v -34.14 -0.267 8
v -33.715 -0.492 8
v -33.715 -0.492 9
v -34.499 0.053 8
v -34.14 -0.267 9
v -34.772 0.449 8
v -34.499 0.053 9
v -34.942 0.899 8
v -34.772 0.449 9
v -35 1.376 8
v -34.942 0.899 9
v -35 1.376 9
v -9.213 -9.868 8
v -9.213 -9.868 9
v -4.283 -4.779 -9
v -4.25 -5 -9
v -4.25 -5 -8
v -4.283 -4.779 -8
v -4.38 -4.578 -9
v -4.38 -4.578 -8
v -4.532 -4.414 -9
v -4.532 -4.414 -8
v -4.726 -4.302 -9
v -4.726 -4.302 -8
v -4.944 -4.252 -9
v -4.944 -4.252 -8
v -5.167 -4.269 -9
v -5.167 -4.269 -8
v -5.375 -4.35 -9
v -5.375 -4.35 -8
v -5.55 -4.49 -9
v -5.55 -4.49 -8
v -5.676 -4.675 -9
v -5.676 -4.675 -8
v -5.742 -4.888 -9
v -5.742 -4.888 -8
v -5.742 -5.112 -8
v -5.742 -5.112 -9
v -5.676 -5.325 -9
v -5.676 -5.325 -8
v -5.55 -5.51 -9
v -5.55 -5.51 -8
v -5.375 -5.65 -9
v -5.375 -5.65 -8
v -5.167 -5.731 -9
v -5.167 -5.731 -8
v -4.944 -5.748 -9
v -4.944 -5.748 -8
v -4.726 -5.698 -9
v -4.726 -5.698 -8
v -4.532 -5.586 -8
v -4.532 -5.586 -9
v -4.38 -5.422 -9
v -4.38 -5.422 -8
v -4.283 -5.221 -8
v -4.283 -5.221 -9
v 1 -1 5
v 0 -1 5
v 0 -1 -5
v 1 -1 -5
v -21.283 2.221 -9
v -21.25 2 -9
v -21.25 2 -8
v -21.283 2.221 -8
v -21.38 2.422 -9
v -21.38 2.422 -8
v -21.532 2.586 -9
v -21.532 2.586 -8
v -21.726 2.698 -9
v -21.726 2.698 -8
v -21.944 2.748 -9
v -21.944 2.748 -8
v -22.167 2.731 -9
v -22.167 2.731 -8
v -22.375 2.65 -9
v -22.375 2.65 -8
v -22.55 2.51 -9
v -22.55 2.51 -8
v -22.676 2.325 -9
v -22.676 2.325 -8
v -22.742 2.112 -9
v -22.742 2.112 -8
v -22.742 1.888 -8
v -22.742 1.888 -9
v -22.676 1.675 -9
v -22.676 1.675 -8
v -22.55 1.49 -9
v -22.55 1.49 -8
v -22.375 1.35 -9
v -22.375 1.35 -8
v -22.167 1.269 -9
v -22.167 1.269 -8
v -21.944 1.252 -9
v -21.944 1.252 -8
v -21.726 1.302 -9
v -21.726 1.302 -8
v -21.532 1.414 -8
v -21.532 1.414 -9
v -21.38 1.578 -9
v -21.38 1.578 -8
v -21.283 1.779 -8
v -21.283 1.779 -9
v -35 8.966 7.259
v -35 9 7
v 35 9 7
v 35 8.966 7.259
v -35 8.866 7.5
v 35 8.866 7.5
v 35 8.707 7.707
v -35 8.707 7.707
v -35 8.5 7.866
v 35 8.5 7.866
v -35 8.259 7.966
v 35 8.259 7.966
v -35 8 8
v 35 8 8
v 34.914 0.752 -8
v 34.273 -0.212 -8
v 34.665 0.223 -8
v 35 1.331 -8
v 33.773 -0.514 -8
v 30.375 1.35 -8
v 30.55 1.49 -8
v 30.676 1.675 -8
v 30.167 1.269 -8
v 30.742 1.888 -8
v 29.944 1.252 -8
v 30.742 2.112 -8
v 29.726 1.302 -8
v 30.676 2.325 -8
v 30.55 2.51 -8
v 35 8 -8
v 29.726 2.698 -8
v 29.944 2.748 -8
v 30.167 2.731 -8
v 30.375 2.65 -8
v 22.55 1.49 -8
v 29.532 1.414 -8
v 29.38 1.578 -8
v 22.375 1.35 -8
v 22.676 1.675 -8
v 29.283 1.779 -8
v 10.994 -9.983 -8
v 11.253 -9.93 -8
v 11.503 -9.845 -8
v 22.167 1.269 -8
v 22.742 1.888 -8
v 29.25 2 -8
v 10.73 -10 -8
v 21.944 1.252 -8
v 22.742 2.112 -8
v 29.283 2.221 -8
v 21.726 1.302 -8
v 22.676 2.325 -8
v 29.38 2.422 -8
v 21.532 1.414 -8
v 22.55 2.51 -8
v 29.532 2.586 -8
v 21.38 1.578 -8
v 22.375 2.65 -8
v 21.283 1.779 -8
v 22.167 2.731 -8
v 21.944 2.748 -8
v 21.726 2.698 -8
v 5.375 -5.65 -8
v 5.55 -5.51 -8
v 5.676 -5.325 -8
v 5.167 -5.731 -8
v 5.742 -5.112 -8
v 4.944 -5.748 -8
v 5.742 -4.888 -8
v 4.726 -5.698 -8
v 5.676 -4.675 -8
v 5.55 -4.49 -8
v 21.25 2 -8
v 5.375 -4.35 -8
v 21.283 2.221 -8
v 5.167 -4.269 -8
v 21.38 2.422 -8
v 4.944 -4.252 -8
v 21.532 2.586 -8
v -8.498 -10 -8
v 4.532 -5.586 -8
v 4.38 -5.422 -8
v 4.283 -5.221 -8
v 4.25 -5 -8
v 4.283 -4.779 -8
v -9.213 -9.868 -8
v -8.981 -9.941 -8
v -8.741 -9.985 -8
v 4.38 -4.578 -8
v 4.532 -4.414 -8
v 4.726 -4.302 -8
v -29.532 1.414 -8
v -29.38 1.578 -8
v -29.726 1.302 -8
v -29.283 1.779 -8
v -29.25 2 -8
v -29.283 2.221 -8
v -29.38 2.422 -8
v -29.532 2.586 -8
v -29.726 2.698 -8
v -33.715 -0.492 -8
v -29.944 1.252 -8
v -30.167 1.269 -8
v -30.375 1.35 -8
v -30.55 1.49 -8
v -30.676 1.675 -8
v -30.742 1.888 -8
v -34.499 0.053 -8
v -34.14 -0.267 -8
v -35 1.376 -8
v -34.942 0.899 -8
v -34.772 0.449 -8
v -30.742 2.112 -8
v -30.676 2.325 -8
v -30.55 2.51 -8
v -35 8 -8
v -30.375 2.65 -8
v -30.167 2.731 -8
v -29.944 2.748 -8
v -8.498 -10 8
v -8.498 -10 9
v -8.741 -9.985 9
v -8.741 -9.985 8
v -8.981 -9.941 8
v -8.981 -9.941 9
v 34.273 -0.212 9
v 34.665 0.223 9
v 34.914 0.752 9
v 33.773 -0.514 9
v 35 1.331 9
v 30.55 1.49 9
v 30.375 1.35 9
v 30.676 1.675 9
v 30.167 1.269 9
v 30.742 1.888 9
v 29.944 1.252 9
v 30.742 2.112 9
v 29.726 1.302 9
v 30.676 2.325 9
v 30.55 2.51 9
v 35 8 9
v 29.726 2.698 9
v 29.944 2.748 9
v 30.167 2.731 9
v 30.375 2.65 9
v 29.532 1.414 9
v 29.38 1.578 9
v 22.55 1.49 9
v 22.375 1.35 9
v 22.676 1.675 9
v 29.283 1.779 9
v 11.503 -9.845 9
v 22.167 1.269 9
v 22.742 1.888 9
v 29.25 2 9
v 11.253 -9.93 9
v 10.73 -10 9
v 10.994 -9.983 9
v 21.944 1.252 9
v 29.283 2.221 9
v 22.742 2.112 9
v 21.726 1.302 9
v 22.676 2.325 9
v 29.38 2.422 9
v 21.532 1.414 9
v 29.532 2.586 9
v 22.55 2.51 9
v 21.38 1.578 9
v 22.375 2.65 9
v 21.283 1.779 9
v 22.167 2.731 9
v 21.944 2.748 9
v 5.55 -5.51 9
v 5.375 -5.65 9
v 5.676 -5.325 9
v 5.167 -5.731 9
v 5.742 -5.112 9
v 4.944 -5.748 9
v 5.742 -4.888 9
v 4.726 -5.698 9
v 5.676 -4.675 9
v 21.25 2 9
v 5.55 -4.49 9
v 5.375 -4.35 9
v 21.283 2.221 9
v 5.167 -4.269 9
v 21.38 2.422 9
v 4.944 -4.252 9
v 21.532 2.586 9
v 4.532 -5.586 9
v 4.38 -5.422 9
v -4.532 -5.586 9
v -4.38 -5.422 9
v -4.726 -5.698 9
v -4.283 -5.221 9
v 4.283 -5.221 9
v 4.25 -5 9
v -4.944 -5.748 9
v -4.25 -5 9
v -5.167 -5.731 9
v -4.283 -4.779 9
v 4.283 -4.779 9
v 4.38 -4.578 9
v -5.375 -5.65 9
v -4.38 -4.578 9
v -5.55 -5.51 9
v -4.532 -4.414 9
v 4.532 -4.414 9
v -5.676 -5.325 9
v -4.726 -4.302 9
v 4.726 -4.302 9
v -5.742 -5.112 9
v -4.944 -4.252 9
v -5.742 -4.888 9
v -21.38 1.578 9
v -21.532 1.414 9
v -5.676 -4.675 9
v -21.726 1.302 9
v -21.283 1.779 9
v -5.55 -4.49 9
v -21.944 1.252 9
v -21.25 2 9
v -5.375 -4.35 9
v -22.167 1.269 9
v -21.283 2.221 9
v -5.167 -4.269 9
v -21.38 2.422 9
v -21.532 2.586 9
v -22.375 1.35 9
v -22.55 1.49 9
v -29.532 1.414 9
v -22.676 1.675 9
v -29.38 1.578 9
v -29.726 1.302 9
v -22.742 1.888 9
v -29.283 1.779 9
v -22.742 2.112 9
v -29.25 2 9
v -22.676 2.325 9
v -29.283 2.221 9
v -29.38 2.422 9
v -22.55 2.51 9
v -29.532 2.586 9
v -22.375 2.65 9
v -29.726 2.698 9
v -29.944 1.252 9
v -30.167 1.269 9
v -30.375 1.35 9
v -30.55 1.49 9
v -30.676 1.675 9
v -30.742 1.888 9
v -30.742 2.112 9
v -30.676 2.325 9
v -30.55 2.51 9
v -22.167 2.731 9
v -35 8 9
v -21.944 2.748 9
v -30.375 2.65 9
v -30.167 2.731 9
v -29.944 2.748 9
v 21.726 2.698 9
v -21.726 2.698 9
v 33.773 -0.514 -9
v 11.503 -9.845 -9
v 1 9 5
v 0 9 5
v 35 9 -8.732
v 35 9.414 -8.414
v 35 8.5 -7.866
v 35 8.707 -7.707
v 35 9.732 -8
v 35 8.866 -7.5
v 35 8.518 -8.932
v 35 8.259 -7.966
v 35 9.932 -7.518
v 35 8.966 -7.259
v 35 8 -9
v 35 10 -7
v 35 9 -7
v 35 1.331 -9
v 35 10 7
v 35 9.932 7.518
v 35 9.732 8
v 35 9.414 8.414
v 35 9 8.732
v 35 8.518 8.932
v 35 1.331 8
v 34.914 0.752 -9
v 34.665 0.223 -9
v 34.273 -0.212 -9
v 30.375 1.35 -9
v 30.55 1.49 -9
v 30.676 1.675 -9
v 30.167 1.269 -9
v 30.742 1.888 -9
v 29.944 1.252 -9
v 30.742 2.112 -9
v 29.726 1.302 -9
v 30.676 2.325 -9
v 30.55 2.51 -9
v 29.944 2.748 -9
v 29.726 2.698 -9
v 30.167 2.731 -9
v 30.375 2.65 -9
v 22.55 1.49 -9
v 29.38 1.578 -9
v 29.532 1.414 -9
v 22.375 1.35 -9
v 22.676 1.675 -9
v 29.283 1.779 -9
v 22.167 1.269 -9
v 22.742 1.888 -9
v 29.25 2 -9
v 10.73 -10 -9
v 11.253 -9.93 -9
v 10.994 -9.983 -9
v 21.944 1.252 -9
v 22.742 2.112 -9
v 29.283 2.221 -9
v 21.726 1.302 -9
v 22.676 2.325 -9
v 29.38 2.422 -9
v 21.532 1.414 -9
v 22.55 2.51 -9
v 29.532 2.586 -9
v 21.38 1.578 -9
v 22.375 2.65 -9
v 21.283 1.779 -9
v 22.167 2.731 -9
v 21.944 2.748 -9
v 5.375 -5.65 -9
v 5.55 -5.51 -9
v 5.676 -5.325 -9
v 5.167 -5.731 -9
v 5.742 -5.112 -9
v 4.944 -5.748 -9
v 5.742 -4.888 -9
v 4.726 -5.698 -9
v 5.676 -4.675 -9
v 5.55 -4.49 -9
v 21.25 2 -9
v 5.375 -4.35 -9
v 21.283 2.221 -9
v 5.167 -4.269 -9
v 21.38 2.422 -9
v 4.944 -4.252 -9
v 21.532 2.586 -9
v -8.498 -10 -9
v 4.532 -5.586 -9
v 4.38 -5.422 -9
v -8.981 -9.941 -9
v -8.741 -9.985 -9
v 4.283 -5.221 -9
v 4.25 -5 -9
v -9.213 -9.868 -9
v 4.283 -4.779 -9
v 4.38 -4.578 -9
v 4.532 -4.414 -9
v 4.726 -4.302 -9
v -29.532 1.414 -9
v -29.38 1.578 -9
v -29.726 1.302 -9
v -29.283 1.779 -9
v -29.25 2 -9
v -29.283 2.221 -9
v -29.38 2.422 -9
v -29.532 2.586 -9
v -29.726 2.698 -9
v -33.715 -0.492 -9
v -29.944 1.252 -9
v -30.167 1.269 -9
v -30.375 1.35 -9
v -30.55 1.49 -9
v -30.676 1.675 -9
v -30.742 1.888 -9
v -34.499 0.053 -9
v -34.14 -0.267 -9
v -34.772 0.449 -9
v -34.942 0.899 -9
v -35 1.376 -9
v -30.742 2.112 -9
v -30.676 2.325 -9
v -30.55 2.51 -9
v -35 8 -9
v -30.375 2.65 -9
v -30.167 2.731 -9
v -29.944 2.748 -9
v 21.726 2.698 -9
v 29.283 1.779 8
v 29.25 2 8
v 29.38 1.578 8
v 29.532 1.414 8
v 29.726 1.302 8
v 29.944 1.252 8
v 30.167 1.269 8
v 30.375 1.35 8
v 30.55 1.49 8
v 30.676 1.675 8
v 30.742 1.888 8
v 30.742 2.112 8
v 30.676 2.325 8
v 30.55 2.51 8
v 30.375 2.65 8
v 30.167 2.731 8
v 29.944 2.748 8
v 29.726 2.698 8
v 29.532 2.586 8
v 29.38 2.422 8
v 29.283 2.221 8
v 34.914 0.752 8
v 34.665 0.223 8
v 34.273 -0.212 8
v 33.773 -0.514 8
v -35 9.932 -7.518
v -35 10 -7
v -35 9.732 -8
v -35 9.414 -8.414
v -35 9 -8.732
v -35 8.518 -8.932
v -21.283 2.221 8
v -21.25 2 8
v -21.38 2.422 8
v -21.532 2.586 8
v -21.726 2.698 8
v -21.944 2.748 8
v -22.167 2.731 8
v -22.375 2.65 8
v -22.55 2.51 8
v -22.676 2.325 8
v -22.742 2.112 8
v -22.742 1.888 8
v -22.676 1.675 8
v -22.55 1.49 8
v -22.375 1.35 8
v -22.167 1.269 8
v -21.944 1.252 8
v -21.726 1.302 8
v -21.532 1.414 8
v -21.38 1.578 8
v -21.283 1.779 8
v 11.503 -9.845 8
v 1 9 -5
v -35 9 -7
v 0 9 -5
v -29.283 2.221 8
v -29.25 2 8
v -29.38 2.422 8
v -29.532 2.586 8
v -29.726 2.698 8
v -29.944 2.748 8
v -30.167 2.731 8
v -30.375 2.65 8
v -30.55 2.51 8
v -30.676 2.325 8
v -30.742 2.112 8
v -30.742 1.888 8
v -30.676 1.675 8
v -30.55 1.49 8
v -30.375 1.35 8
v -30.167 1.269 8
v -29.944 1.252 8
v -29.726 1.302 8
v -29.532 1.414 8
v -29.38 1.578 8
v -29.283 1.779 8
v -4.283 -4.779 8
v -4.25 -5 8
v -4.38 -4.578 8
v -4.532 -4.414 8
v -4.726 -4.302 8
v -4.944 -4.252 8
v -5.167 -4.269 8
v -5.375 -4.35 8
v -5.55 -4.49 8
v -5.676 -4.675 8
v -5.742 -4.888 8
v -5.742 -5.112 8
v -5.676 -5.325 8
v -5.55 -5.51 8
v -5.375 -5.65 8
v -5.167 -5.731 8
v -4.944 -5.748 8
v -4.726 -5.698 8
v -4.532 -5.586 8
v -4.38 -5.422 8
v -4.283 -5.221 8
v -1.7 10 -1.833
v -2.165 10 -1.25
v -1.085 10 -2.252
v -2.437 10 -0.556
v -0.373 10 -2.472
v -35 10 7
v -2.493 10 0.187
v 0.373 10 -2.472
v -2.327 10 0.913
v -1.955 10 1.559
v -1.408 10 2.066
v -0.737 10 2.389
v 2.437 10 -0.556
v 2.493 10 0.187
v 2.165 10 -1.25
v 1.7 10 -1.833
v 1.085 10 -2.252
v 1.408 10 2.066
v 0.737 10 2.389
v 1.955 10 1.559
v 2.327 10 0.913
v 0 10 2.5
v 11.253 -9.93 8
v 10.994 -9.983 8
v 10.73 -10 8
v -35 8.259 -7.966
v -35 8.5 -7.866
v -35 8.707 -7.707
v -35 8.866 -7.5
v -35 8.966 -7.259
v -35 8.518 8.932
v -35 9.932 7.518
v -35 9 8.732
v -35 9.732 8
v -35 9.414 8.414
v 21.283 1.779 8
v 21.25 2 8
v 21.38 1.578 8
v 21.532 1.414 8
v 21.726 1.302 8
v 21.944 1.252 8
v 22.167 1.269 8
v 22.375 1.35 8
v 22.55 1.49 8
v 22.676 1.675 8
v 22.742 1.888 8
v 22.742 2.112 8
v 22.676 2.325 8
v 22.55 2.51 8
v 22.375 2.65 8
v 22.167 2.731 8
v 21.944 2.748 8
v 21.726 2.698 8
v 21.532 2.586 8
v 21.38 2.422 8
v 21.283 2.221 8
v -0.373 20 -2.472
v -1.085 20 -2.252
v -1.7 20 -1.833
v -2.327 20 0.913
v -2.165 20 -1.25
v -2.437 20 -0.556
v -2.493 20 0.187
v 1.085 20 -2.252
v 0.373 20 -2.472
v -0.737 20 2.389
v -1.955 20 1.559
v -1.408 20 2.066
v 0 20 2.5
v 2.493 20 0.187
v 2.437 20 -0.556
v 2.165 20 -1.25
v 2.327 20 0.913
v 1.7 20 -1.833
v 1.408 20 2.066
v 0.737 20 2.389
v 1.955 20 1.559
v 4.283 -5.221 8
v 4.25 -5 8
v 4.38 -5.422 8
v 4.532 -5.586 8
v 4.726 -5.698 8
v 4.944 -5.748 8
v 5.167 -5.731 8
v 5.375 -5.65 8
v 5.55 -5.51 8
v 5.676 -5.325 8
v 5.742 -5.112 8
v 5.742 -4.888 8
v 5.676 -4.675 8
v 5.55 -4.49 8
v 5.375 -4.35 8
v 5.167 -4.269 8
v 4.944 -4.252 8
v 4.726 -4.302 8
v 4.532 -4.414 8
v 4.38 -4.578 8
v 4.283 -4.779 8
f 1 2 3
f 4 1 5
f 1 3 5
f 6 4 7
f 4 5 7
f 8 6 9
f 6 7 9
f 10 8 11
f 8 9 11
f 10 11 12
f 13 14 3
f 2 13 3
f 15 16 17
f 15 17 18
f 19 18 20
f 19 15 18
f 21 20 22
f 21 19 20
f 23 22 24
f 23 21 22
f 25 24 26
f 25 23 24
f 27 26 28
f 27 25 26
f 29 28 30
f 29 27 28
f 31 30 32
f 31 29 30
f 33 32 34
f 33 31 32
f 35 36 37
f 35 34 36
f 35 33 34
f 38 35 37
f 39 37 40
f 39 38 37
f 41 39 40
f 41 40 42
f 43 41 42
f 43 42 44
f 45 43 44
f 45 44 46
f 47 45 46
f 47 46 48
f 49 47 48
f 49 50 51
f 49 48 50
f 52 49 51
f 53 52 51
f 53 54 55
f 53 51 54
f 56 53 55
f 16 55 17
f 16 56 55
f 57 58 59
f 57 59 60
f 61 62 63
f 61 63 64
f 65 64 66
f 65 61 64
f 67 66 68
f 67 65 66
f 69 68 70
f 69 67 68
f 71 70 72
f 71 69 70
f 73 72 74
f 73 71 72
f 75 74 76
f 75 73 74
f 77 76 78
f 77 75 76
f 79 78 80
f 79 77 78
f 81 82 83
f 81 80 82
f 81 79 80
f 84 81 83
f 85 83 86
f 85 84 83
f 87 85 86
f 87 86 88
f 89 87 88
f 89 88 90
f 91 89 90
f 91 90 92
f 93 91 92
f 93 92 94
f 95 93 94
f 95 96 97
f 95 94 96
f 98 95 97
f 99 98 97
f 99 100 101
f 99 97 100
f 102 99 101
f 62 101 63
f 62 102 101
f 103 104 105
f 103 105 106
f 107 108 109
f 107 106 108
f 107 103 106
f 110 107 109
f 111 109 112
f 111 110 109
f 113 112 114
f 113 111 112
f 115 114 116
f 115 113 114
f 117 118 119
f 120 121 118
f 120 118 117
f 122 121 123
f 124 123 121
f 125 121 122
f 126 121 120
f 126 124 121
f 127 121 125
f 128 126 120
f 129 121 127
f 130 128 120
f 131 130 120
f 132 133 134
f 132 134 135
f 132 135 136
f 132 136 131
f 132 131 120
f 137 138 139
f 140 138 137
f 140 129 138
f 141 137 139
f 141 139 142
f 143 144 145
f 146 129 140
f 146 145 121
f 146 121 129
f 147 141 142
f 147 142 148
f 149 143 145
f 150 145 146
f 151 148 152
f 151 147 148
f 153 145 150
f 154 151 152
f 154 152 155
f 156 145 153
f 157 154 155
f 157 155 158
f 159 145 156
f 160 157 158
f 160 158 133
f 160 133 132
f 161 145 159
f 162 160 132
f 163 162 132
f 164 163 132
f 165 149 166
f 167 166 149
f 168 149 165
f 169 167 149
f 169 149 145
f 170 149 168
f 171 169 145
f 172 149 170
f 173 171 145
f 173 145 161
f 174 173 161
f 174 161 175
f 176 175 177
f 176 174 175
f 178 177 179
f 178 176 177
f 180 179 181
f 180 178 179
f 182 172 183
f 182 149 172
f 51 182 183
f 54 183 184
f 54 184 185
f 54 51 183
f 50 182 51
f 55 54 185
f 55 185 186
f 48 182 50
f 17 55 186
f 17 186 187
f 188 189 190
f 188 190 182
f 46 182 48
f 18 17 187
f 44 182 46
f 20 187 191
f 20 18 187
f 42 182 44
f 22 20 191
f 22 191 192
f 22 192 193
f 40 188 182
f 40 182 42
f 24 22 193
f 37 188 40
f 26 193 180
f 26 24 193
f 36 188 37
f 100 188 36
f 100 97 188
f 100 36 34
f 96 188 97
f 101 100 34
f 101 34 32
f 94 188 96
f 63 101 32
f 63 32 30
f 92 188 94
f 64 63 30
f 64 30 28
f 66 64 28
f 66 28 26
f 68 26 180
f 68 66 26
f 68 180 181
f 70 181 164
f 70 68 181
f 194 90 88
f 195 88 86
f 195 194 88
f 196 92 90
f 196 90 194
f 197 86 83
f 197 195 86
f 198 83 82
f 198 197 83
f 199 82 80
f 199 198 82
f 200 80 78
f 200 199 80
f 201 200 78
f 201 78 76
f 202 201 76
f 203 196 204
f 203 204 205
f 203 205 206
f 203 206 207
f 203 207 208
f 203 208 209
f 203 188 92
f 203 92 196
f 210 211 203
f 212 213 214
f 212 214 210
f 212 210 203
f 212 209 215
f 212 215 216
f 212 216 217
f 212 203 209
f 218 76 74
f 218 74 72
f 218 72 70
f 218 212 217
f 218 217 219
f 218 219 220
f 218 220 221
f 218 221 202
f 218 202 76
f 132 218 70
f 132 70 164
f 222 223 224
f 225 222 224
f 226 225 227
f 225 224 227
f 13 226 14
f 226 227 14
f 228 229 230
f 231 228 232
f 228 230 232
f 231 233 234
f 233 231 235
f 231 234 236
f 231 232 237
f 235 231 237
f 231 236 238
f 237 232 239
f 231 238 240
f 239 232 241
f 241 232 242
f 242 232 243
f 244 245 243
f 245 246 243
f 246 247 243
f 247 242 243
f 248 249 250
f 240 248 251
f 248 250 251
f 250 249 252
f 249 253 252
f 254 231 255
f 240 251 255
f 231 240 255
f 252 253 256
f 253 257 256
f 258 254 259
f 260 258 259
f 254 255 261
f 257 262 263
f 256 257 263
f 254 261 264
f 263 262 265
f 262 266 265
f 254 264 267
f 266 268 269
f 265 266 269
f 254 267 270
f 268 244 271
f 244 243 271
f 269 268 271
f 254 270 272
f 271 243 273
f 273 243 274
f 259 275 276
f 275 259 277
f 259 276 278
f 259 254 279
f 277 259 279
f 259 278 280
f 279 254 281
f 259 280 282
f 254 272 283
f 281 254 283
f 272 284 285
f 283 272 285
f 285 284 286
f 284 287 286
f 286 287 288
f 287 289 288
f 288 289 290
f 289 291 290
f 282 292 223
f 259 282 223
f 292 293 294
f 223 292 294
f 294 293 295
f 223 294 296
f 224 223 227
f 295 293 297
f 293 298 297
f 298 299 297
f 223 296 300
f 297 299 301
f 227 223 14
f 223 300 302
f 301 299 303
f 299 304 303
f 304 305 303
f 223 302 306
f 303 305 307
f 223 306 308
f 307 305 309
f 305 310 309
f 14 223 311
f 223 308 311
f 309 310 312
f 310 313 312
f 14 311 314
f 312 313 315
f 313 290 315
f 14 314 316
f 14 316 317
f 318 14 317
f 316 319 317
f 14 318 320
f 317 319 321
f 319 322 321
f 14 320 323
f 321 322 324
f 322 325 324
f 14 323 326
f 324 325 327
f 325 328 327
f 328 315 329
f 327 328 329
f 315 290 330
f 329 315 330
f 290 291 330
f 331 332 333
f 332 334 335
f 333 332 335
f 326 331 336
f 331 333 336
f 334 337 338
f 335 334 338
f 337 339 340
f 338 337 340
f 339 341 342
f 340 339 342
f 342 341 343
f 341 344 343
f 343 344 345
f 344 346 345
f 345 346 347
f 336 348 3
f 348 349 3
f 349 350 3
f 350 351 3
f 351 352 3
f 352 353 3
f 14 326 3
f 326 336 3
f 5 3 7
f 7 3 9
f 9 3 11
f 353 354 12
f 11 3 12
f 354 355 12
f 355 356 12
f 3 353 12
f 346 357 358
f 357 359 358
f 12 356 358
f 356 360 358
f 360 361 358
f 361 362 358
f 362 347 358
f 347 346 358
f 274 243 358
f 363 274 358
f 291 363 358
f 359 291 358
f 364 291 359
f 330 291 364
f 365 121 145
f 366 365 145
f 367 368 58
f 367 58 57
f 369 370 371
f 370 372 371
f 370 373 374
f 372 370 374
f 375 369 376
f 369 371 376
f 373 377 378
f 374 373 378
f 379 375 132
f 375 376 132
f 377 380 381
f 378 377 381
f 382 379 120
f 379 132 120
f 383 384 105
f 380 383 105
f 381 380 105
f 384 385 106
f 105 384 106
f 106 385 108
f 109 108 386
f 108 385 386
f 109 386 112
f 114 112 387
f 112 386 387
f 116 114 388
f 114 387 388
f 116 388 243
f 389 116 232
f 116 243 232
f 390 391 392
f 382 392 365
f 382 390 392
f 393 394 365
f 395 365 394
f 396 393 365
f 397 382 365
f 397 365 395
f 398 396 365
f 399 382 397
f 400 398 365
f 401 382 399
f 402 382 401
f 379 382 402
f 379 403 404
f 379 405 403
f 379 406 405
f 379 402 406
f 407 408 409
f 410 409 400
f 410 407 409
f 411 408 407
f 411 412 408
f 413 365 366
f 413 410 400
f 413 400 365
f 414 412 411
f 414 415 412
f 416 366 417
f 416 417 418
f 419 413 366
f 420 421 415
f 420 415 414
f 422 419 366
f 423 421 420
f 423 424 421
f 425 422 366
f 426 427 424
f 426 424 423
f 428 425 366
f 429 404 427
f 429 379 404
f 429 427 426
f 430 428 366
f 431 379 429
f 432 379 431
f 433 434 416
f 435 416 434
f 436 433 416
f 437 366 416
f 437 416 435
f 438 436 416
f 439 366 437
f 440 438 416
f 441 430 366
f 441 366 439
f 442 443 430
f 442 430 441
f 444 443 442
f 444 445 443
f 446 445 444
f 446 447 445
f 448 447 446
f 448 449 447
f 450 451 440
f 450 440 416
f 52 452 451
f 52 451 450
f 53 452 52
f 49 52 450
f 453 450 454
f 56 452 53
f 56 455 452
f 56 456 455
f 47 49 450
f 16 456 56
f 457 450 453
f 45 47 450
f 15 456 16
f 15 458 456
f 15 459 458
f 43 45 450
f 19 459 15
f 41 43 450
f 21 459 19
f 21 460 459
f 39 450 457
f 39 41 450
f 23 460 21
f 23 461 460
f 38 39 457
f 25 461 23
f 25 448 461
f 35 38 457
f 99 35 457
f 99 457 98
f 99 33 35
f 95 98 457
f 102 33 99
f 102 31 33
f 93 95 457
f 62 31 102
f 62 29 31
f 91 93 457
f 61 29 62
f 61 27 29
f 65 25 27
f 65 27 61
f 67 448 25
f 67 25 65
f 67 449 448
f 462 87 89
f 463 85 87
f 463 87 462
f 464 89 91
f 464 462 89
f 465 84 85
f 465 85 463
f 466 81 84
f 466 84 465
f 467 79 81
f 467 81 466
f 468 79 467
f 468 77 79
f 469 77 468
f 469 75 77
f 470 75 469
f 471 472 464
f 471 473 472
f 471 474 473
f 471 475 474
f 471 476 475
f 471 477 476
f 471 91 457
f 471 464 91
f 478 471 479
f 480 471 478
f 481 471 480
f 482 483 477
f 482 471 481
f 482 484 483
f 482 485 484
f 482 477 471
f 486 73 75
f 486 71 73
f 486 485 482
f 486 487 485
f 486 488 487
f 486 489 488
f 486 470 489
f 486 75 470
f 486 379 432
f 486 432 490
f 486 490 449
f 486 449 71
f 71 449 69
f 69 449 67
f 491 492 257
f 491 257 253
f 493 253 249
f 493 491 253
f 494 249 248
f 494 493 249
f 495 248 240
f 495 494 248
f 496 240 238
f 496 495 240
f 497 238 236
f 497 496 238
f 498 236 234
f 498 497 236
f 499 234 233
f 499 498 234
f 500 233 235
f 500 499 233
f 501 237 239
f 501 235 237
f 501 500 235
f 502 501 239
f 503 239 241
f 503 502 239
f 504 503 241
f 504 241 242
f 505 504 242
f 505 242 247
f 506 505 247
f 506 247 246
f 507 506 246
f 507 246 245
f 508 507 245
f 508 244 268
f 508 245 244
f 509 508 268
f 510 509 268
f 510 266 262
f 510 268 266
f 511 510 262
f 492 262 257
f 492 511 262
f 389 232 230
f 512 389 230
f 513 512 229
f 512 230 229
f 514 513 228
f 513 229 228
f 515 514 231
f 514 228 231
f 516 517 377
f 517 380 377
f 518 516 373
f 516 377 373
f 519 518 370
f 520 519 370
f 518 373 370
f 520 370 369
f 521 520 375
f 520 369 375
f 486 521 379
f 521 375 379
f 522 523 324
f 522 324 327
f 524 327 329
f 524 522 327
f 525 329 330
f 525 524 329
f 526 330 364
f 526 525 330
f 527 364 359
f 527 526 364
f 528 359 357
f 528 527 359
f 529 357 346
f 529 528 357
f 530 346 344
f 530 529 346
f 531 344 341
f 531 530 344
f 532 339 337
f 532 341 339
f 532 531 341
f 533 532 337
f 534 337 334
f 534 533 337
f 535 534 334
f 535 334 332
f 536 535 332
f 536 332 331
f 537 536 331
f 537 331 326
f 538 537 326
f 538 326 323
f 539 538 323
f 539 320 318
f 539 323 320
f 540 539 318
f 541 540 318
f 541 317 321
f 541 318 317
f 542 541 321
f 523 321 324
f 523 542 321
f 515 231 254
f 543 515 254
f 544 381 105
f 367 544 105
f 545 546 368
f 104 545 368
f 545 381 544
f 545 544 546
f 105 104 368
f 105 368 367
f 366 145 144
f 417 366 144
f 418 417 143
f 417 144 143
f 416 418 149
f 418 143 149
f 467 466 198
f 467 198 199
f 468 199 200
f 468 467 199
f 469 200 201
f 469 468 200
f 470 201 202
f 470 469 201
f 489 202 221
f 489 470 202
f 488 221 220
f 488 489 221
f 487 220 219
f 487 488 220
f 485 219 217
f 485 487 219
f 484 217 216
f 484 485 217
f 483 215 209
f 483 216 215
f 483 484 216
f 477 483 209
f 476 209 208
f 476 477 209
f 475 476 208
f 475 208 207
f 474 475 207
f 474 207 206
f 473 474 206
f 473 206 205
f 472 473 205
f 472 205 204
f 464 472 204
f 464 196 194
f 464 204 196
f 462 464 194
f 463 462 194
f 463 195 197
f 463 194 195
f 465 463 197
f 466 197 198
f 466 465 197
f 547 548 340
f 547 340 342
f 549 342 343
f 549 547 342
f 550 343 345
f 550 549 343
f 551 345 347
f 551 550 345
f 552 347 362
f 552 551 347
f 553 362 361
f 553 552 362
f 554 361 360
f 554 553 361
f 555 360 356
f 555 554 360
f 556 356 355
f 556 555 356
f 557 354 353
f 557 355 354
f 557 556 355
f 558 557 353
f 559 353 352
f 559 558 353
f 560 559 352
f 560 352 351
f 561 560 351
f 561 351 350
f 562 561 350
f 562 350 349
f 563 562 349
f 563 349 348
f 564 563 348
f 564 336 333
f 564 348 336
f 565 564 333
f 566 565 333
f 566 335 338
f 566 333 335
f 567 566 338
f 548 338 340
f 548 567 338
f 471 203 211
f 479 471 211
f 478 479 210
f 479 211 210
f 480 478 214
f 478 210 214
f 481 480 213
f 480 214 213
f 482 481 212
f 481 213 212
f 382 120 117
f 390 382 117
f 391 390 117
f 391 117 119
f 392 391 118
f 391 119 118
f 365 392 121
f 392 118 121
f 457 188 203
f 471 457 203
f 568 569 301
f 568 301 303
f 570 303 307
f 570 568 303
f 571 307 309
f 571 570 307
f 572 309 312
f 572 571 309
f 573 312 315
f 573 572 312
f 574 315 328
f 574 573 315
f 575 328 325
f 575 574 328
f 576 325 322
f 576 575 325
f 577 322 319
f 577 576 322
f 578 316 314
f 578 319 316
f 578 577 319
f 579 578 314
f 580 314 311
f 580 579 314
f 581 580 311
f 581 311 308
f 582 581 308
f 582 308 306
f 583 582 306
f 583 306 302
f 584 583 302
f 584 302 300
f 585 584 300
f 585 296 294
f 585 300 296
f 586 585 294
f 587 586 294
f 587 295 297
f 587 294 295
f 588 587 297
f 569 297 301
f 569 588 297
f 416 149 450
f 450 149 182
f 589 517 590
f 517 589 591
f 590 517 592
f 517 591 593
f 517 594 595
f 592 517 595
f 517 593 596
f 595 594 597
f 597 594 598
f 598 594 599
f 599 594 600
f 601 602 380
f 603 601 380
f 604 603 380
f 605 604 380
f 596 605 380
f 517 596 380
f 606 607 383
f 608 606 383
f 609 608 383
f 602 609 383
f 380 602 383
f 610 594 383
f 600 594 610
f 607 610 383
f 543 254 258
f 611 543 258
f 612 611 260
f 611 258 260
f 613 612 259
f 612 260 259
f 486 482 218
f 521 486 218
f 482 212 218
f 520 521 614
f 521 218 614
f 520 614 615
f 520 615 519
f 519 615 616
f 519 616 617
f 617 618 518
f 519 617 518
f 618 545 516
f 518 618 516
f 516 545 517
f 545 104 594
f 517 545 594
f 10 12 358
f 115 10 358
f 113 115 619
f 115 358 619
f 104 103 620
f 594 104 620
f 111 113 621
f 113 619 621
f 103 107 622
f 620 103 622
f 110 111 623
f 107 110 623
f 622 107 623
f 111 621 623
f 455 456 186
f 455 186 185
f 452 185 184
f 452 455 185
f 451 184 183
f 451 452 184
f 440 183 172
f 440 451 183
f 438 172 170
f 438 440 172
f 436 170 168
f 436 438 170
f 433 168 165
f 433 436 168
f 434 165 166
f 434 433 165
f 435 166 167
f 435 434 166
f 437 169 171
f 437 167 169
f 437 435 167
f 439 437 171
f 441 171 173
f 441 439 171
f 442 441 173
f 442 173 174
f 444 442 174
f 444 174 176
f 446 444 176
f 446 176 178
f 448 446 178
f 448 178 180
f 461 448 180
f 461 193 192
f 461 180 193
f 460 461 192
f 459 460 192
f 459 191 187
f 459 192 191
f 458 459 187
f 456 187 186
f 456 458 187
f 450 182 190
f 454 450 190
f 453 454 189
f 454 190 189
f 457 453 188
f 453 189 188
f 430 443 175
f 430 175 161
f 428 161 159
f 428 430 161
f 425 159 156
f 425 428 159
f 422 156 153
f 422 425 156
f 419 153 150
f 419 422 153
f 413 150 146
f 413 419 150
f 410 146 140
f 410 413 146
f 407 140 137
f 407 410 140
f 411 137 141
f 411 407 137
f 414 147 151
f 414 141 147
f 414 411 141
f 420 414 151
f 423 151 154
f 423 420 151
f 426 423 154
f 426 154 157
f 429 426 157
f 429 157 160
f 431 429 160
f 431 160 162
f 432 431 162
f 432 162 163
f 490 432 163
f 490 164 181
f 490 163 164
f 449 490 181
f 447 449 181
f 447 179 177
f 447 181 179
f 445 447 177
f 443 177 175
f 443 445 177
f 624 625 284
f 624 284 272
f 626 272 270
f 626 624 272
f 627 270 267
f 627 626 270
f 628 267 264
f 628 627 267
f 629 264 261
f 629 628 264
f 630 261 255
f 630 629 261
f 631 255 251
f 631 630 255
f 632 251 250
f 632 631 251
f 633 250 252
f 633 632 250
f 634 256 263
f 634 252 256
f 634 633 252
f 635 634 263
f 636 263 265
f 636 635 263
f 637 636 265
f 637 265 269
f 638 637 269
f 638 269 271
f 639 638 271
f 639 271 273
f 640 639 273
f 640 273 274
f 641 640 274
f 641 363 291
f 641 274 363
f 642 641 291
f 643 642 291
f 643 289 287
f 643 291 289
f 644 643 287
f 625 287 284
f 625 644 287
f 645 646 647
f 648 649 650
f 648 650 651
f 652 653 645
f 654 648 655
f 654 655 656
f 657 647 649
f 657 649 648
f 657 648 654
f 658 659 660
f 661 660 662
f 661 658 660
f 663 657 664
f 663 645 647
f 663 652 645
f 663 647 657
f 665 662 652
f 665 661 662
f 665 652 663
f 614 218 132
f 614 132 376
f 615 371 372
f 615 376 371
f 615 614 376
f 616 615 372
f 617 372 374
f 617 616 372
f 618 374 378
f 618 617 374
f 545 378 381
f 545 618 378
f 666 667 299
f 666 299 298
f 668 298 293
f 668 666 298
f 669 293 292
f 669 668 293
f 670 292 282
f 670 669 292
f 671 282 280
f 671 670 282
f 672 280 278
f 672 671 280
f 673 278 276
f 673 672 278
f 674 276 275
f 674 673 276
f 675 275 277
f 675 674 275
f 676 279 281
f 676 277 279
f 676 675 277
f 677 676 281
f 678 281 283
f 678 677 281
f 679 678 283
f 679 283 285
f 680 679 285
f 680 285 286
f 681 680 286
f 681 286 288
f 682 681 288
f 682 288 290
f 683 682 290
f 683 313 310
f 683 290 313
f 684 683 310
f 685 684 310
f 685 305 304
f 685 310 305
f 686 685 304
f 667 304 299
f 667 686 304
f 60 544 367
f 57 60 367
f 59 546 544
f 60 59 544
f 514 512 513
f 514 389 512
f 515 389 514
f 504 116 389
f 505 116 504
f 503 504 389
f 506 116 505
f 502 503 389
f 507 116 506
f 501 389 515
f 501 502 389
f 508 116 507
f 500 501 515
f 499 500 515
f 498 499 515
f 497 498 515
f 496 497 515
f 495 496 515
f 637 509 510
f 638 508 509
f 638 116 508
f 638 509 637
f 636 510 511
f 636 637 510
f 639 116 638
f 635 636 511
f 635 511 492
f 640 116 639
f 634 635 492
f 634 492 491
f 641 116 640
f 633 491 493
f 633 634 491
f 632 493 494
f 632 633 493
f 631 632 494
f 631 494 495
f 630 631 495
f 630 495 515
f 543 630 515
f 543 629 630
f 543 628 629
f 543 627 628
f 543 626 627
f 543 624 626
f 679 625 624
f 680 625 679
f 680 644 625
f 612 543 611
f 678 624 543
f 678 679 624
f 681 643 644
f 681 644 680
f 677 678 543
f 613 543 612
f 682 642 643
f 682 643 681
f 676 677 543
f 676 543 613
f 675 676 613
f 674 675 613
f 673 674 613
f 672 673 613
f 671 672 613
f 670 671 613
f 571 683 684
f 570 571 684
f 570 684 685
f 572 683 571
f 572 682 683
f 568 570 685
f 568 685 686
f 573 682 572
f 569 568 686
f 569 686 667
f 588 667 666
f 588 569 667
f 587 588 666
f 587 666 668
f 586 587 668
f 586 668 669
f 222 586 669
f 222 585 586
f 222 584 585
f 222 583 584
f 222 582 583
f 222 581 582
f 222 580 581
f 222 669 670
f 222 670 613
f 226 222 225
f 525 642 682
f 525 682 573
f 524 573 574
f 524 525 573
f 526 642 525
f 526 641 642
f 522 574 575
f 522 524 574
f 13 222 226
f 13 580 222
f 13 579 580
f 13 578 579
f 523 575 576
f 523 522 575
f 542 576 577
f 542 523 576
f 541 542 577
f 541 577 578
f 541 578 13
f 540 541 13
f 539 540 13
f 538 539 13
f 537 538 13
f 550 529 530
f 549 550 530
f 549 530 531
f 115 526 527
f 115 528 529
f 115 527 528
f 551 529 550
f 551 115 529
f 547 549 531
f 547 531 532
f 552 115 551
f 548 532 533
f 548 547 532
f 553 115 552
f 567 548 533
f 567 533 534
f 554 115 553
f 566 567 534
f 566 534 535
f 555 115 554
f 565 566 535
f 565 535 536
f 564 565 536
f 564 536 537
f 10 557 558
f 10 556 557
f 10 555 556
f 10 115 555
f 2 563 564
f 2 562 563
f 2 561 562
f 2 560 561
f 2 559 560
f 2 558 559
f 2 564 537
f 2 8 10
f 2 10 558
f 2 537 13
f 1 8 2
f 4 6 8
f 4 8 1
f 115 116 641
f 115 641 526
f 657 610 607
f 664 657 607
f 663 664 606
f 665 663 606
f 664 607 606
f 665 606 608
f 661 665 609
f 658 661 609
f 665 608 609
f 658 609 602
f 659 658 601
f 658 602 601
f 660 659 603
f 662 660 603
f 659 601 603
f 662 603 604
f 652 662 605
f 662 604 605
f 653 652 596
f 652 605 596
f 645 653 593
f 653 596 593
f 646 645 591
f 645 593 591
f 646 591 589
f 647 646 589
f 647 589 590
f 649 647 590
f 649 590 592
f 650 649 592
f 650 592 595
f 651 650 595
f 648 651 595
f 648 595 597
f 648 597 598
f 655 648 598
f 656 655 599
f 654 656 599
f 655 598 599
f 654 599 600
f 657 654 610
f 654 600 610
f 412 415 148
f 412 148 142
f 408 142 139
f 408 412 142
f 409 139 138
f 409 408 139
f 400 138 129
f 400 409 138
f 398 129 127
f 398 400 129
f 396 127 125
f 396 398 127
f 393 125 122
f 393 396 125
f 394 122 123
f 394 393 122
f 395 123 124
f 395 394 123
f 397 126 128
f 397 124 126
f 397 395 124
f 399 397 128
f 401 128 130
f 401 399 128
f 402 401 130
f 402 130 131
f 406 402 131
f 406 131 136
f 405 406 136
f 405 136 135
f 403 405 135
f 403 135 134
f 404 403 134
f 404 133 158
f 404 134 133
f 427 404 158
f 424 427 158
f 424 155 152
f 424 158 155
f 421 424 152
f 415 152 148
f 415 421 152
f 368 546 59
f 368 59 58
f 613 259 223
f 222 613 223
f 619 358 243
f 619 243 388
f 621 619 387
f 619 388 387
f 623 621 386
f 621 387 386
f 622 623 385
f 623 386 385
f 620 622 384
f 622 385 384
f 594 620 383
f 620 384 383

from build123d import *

# Parameters (mm, degrees)
BOSS_EXTRUDE1_DEPTH     = 9
FILLET1_R               = 2
CUT_EXTRUDE1_DEPTH      = 38.496666519
CUT_EXTRUDE1_DEPTH_BACK = 38.496666519
SKETCH3_R               = 2.5
BOSS_EXTRUDE2_DEPTH     = 10
CUT_EXTRUDE2_DEPTH      = 42.303752856
CUT_EXTRUDE2_DEPTH_BACK = 42.303752856
SKETCH4_R               = 0.75
SKETCH5_W               = 1
SKETCH5_H               = 10
BOSS_EXTRUDE3_DEPTH     = 10


with BuildPart() as part:
    # Sketch1 → Boss-Extrude1 (new, symmetric)
    with BuildSketch(Plane.XY):
        with BuildLine():
            ThreePointArc((-33.714795211, -0.491812162), (-34.647663561, 0.242423764), (-35, 1.376092494))
            Line((-35, 1.376092494), (-35, 10))
            Line((-35, 10), (35, 10))
            Line((35, 10), (35, 1.330500849))
            ThreePointArc((35, 1.330500849), (34.665188238, 0.222733667), (33.772851869, -0.514140034))
            Line((33.772851869, -0.514140034), (11.50283608, -9.844640883))
            ThreePointArc((11.50283608, -9.844640883), (11.12414042, -9.960775582), (10.729984211, -10))
            Line((10.729984211, -10), (-8.498371341, -10))
            ThreePointArc((-8.498371341, -10), (-8.861820571, -9.966698924), (-9.213166552, -9.867904657))
            Line((-9.213166552, -9.867904657), (-33.714795211, -0.491812162))
        make_face()
    extrude(amount=BOSS_EXTRUDE1_DEPTH, both=True)

    # Fillet1
    fillet1_edges = [part.edges().sort_by_distance(p)[0] for p in [
        (0, 10, -9),
        (0, 10, 9),
    ]]
    fillet(fillet1_edges, radius=FILLET1_R)

    # Sketch2 → Cut-Extrude1 (cut, two sides: drawn at the far end of the back side and taken through both)
    with BuildSketch(Plane(origin=(0, 0, 0), x_dir=(0, 0, -1), z_dir=(1, 0, 0)).offset(-CUT_EXTRUDE1_DEPTH_BACK)):
        with BuildLine():
            Line((-8, 8), (-8, -14.234256749))
            Line((-8, -14.234256749), (8, -14.234256749))
            Line((8, -14.234256749), (8, 1.330500849))
            Line((8, 1.330500849), (8, 8))
            ThreePointArc((8, 8), (7.707106781, 8.707106781), (7, 9))
            Line((7, 9), (-7, 9))
            ThreePointArc((-7, 9), (-7.707106781, 8.707106781), (-8, 8))
        make_face()
    extrude(amount=CUT_EXTRUDE1_DEPTH + CUT_EXTRUDE1_DEPTH_BACK, mode=Mode.SUBTRACT)

    # Sketch3 → Boss-Extrude2 (add)
    with BuildSketch(Plane(origin=(0, 10, 0), x_dir=(1, 0, 0), z_dir=(0, 1, 0))):
        with Locations(Location((0, 0, 0), (0, 0, 270))):
            Circle(SKETCH3_R)
    extrude(amount=BOSS_EXTRUDE2_DEPTH)

    # Sketch4 → Cut-Extrude2 (cut, two sides: drawn at the far end of the back side and taken through both)
    with BuildSketch(Plane.XY.offset(-CUT_EXTRUDE2_DEPTH_BACK)):
        with Locations((-30, 2)):
            Circle(SKETCH4_R)
        with Locations((-22, 2)):
            Circle(SKETCH4_R)
        with Locations((-5, -5)):
            Circle(SKETCH4_R)
        with Locations(Location((5, -5, 0), (0, 0, 180))):
            Circle(SKETCH4_R)
        with Locations(Location((22, 2, 0), (0, 0, 180))):
            Circle(SKETCH4_R)
        with Locations(Location((30, 2, 0), (0, 0, 180))):
            Circle(SKETCH4_R)
    extrude(amount=CUT_EXTRUDE2_DEPTH + CUT_EXTRUDE2_DEPTH_BACK, mode=Mode.SUBTRACT)

    # Sketch5 → Boss-Extrude3 (add)
    with BuildSketch(Plane.XZ.offset(-9)):
        with Locations((0.5, 0)):
            Rectangle(SKETCH5_W, SKETCH5_H)
    extrude(amount=BOSS_EXTRUDE3_DEPTH)


solid = part.part
